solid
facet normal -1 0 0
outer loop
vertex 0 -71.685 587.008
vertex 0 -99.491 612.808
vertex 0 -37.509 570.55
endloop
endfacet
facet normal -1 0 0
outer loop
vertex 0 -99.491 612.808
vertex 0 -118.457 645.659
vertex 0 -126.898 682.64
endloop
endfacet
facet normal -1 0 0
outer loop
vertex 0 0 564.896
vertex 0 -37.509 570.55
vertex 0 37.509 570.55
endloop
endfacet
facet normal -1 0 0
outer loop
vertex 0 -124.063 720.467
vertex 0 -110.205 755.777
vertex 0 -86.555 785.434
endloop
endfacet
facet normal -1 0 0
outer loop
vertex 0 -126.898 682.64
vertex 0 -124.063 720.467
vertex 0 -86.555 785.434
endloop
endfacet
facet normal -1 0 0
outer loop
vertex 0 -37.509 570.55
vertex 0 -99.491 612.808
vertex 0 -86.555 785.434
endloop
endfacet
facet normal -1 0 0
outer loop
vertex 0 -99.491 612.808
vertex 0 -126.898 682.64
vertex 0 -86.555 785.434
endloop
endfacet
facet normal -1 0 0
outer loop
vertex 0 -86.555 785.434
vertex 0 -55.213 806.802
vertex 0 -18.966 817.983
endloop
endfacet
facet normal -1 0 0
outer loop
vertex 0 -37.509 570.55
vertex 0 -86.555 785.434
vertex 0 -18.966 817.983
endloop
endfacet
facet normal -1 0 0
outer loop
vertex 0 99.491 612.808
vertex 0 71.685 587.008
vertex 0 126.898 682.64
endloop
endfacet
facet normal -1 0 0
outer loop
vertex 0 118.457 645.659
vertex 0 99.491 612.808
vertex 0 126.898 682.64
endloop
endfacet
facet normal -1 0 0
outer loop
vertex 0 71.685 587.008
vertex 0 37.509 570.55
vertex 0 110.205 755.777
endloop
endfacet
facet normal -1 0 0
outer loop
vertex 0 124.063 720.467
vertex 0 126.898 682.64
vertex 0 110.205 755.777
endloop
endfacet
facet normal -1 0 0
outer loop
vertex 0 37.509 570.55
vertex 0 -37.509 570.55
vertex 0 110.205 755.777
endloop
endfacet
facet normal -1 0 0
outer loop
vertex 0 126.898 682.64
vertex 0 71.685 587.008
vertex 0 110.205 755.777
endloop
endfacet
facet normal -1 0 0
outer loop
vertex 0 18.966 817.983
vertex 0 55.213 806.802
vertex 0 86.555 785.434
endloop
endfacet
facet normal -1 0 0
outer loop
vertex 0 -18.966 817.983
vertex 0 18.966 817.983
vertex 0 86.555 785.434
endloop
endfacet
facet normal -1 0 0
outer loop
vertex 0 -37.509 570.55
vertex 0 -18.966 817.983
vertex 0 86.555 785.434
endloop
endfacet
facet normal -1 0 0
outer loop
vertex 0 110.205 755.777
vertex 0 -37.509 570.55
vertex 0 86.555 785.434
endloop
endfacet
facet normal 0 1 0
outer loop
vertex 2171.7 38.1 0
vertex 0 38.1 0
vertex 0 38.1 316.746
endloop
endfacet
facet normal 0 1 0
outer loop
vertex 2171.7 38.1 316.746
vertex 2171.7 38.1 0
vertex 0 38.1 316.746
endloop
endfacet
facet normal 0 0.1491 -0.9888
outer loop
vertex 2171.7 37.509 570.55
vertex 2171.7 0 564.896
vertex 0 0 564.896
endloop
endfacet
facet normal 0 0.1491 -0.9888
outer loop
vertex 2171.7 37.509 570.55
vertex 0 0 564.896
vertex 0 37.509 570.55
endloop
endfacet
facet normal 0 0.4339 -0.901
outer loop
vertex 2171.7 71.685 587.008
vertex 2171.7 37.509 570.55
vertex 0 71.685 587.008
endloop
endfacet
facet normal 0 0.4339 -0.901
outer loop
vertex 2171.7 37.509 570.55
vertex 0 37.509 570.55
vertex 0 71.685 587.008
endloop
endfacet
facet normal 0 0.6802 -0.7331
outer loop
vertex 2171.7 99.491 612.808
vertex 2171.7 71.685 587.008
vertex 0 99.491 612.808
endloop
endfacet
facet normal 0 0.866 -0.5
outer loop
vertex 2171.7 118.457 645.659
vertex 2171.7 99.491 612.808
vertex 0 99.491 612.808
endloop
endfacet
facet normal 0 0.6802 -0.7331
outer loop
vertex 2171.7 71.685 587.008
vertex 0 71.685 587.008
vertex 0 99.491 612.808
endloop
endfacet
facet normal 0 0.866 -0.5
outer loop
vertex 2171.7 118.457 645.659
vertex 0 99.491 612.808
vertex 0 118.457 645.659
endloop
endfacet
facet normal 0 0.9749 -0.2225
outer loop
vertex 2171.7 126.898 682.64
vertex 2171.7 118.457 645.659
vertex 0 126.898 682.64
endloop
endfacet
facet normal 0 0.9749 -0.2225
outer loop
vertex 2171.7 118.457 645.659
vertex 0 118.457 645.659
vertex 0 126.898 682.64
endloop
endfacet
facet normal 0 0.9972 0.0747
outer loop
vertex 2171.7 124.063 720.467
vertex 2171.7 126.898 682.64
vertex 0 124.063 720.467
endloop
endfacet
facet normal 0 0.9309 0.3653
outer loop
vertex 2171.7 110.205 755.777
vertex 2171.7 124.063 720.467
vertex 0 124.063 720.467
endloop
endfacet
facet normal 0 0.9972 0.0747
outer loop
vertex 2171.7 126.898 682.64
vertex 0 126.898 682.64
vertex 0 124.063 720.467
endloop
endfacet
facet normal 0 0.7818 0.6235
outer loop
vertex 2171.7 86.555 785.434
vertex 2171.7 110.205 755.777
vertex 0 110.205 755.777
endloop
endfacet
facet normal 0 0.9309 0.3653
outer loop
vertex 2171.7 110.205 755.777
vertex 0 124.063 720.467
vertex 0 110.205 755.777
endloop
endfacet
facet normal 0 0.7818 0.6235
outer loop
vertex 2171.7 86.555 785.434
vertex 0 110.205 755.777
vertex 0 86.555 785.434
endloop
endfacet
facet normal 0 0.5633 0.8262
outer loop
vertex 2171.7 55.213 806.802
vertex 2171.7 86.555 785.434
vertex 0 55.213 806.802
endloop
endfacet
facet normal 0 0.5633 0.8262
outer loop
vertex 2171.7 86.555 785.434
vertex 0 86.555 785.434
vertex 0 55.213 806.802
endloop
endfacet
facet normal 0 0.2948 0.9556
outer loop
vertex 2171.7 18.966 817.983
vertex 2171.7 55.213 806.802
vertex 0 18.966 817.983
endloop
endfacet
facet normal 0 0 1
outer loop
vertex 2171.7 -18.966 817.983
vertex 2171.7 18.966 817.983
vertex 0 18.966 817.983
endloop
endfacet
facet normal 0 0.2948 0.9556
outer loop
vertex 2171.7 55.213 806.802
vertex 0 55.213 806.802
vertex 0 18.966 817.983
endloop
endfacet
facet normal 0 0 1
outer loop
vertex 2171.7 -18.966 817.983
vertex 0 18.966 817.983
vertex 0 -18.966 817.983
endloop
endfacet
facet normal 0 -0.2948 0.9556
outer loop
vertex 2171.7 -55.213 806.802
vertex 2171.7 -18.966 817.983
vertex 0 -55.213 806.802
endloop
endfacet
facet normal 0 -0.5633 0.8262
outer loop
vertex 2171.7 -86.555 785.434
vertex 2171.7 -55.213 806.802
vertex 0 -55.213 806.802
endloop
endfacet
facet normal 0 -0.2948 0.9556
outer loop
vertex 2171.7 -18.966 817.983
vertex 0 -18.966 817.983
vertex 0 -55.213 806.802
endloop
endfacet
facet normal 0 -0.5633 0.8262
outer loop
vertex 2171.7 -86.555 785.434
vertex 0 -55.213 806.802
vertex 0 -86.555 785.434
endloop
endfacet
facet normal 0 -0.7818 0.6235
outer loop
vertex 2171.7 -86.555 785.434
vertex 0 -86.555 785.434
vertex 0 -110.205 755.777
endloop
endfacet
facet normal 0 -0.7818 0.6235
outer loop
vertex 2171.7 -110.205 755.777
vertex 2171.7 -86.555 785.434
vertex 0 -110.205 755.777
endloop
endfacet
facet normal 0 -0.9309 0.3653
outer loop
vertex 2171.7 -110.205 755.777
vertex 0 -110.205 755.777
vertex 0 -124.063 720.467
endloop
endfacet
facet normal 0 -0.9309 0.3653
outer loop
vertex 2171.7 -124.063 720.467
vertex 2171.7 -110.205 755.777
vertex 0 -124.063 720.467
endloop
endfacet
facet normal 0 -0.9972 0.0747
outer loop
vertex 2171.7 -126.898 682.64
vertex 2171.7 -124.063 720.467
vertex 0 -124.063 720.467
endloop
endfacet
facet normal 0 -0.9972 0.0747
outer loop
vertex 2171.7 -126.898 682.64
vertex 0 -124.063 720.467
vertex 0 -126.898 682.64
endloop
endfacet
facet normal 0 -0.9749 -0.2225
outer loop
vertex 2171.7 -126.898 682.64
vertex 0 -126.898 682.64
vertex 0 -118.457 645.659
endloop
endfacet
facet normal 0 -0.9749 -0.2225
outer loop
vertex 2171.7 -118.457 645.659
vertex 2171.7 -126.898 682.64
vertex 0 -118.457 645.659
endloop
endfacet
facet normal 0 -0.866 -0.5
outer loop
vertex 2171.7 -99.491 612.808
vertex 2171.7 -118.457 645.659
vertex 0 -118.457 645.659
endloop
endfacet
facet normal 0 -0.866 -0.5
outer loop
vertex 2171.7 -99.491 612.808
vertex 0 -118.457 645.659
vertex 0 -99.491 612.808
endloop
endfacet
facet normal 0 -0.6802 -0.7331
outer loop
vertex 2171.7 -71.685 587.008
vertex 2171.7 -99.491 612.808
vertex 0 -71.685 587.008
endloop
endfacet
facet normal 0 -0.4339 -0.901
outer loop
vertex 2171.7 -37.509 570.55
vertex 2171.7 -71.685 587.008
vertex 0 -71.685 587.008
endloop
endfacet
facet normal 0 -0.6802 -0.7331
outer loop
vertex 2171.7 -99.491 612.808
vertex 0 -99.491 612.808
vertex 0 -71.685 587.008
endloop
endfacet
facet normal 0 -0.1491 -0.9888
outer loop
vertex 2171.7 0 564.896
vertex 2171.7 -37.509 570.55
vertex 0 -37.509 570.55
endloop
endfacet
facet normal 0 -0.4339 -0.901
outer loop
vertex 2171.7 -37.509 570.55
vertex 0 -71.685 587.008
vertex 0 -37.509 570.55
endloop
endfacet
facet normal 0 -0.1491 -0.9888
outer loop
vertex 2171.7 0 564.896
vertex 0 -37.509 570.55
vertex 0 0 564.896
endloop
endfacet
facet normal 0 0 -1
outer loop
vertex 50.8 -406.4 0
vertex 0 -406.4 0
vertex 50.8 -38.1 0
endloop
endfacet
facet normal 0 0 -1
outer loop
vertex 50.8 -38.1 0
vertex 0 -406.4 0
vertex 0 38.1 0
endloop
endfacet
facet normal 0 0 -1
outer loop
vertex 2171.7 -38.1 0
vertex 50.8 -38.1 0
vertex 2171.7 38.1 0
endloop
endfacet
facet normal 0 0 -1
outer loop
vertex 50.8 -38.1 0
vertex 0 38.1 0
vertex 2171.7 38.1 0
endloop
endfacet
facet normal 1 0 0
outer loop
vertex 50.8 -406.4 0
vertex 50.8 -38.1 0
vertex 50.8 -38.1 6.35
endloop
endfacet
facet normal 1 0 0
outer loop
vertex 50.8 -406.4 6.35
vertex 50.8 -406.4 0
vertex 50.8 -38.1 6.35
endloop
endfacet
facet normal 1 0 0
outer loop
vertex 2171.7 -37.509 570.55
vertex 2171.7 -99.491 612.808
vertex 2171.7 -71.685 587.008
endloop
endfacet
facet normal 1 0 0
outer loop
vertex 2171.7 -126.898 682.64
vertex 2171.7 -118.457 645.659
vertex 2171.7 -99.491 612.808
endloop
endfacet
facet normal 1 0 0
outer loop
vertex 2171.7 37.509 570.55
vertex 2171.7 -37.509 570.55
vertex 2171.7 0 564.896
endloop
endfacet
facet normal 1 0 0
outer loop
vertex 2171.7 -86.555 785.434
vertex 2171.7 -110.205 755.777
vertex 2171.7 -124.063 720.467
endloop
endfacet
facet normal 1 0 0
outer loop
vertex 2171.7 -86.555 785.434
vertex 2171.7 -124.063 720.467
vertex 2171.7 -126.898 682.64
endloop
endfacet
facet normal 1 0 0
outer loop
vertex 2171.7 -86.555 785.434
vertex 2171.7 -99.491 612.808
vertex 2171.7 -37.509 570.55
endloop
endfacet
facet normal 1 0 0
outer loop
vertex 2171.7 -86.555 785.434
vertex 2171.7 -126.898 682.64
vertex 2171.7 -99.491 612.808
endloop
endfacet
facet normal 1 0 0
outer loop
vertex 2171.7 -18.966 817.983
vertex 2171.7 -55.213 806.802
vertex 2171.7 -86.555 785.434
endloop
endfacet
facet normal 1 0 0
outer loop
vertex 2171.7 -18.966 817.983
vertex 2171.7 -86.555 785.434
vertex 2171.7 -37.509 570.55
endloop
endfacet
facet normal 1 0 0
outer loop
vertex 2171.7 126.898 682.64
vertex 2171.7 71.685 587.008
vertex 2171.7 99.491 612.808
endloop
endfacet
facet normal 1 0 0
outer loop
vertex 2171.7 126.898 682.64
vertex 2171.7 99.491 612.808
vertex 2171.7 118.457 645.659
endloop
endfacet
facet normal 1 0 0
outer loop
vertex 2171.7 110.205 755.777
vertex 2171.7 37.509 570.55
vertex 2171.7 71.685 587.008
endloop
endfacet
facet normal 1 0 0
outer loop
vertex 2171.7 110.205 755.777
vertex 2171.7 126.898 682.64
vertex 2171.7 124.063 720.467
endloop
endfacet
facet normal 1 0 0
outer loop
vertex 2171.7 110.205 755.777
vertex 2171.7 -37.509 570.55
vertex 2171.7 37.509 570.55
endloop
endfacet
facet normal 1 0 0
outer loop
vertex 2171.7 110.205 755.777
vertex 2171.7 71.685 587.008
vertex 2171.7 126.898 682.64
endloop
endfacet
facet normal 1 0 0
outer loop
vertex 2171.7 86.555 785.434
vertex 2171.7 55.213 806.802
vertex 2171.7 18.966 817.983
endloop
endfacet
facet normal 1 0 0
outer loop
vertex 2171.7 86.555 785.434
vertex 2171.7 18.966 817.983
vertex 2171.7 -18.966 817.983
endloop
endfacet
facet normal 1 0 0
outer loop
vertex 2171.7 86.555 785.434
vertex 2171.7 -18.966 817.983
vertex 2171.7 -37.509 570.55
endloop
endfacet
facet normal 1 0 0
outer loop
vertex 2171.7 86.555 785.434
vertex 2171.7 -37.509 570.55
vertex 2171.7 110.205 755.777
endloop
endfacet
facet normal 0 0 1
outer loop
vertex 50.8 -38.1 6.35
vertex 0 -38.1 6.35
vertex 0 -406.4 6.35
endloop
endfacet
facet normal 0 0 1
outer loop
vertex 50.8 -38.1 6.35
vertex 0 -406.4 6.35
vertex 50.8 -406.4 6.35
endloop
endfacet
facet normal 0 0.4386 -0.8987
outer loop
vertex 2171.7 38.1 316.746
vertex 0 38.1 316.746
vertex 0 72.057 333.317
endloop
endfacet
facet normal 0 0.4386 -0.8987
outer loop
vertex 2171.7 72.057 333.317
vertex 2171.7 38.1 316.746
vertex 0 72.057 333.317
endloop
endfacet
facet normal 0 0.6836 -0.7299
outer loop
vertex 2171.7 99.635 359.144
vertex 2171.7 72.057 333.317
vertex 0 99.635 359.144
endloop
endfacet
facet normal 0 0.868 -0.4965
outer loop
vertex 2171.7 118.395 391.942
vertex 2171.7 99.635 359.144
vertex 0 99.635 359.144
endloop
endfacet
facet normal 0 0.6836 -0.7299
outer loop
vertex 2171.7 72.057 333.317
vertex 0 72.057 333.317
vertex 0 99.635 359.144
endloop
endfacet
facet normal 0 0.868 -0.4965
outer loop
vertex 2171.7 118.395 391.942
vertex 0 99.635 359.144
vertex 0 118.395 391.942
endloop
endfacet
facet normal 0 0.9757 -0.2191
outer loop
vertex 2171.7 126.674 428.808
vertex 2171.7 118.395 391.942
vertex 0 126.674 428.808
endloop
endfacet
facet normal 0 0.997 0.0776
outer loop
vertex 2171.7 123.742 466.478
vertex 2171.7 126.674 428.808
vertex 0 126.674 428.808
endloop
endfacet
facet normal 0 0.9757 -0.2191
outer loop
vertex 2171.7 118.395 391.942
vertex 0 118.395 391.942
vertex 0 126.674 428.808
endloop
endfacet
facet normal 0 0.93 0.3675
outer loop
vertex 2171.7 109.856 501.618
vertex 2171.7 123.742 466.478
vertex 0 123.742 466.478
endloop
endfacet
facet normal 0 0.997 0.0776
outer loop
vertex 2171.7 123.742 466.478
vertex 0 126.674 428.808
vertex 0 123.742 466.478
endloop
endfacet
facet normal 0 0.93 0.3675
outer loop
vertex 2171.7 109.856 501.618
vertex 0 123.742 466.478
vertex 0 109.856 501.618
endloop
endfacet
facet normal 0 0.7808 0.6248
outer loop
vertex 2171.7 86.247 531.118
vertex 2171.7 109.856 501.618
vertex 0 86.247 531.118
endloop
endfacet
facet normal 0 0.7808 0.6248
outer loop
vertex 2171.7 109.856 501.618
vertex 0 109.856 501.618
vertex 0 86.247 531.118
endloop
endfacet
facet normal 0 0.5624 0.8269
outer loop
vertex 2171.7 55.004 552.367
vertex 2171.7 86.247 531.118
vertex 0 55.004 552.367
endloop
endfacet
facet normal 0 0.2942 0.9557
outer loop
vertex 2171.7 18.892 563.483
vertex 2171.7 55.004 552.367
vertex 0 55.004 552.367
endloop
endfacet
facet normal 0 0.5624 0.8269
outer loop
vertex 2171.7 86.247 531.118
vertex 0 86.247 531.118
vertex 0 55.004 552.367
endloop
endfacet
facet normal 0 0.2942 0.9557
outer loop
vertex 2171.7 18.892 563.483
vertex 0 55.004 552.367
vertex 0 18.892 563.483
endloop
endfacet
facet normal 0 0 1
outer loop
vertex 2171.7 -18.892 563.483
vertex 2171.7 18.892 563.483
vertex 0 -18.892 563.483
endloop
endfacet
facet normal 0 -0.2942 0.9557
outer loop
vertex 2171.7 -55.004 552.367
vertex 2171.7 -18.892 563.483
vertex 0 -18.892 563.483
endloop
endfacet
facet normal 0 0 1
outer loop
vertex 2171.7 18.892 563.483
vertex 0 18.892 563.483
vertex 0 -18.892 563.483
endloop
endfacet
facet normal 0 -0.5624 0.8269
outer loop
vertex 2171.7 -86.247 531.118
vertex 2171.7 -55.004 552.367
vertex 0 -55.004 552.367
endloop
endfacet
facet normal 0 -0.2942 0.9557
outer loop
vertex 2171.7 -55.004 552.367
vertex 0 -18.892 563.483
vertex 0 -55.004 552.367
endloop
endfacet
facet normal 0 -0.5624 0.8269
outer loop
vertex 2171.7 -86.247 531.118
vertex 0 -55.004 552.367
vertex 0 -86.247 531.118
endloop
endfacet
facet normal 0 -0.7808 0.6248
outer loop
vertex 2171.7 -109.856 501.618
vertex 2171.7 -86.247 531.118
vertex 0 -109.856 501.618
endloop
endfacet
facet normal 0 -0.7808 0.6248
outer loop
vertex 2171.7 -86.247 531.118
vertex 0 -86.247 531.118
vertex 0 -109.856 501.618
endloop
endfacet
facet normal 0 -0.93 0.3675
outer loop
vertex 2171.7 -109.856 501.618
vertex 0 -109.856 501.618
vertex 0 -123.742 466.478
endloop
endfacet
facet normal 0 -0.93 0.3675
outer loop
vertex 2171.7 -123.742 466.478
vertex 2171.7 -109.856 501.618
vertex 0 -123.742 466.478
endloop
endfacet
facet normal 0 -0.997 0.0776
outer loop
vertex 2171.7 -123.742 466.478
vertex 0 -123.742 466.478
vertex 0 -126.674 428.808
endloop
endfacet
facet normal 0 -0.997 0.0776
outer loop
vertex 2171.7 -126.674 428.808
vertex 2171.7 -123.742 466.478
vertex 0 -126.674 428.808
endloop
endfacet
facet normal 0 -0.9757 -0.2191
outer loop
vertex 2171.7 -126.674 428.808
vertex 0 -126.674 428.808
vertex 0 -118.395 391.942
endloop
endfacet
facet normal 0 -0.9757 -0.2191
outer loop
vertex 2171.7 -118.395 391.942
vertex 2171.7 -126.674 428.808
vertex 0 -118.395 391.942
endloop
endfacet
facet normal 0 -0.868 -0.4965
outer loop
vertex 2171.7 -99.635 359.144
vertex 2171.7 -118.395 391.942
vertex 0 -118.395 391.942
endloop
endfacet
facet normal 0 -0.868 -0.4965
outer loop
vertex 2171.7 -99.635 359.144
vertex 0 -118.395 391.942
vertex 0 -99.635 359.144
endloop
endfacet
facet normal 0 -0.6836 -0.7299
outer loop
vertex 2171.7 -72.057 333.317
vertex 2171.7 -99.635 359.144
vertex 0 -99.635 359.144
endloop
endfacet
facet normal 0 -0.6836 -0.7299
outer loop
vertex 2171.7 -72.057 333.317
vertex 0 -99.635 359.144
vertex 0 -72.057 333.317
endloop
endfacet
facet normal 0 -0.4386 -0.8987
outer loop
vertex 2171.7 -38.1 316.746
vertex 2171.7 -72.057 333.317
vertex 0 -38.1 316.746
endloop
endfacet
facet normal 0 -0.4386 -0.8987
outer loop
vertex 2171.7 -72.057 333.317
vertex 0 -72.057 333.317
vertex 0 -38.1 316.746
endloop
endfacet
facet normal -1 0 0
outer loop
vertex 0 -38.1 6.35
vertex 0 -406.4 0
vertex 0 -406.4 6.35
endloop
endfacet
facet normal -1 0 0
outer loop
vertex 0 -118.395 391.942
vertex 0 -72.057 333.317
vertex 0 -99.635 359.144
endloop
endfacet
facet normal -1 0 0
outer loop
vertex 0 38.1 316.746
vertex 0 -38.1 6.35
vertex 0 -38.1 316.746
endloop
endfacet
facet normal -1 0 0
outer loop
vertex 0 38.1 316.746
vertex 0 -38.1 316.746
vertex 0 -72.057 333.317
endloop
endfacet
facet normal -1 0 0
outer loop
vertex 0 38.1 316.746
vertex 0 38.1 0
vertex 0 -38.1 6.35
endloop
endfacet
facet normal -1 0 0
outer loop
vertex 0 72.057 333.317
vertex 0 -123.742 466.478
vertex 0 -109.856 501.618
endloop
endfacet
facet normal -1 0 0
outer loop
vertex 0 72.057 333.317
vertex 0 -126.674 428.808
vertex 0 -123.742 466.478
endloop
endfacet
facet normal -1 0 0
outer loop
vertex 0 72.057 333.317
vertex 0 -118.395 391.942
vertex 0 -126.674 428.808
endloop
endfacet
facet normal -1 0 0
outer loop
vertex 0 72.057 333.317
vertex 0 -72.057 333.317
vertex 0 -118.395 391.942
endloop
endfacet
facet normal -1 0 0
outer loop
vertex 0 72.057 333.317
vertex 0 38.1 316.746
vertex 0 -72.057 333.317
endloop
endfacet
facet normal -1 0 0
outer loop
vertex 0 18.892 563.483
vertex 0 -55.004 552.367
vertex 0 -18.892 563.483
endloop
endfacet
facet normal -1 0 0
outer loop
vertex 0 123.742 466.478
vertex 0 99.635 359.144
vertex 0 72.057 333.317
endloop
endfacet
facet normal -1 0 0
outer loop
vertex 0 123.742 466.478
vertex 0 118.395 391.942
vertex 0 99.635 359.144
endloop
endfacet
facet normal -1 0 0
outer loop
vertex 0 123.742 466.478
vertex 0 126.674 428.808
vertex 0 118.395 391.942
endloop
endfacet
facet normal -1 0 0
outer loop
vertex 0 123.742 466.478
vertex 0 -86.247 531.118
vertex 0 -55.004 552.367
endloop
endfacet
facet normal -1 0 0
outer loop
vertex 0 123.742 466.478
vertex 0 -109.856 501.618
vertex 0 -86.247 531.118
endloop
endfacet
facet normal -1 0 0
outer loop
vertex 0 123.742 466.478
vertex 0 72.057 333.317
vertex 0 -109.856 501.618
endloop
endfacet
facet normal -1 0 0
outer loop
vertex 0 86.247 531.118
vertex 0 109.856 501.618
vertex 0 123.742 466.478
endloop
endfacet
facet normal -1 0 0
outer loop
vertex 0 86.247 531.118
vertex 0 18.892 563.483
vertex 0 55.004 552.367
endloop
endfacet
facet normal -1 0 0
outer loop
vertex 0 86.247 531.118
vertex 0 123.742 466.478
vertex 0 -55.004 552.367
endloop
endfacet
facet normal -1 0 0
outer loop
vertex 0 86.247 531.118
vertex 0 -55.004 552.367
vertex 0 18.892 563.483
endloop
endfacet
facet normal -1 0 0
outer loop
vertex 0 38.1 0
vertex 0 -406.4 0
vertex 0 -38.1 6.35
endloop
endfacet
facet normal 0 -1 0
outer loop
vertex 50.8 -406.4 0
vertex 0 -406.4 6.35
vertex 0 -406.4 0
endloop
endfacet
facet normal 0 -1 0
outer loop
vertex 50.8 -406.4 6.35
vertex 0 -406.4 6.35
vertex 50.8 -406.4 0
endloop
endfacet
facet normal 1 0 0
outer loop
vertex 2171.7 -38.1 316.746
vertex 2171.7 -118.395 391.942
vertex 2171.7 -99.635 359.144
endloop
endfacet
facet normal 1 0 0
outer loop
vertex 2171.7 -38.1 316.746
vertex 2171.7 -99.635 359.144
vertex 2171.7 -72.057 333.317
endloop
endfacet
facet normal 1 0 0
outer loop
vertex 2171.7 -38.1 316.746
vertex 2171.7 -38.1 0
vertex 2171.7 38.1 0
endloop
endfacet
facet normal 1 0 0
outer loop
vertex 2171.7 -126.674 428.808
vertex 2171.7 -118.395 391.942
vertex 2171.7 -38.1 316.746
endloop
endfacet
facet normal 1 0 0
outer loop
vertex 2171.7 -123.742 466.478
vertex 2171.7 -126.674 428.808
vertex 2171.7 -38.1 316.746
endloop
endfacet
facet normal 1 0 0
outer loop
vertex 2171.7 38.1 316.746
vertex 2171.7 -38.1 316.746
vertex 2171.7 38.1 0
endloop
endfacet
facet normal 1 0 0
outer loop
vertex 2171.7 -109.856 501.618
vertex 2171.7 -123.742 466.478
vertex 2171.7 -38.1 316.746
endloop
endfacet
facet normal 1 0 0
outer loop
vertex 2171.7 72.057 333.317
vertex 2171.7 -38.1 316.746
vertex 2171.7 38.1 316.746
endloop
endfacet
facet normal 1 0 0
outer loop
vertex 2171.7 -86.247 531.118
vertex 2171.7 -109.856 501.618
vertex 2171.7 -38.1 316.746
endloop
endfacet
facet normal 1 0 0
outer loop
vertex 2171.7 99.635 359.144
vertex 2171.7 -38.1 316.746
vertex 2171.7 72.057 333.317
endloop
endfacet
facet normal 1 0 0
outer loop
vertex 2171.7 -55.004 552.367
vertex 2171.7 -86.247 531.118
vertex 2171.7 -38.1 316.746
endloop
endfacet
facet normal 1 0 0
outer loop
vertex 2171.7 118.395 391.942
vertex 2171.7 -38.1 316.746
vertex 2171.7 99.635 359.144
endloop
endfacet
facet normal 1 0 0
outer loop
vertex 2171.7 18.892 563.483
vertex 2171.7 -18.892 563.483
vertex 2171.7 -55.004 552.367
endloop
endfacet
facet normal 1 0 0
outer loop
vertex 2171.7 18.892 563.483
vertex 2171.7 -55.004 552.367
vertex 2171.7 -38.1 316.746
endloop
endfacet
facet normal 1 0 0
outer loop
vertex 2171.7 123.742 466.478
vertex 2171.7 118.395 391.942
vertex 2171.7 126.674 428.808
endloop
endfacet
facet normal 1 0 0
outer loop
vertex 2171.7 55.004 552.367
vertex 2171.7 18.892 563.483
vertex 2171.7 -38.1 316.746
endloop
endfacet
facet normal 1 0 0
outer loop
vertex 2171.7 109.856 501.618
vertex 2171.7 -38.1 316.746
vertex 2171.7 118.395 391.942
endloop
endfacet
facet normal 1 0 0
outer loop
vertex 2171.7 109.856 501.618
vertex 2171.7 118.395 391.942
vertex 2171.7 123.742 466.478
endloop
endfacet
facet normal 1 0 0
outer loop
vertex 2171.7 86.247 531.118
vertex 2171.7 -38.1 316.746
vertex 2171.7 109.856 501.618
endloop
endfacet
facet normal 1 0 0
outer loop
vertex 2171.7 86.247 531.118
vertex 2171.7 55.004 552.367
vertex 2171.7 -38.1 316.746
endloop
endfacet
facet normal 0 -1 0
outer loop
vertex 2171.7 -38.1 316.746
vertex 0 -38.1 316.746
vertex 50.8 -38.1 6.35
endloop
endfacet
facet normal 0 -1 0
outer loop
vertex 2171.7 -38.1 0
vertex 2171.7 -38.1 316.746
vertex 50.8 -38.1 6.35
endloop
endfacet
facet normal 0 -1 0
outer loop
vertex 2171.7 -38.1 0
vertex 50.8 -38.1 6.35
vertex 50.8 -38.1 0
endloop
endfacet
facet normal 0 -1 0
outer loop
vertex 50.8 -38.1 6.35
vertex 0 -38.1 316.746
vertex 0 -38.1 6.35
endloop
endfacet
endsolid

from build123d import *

# Parameters (mm, degrees)
F1_DEPTH = 2171.7
F2_W     = 50.8
F2_H     = 6.35
F3_DEPTH = 406.4


with BuildPart() as f1:
    # F0 (on Right) → F1 (new body)
    with BuildSketch(Plane.YZ):
        with BuildLine():
            ThreePointArc((127.254, 692.15), (-89.9821663331, 782.1321663331), (0, 564.896))
            ThreePointArc((0, 564.896), (89.9821663331, 602.1678336669), (127.254, 692.15))
        make_face()
    extrude(amount=F1_DEPTH)


with BuildPart() as f1b:
    # F0 (on Right) → F1, piece 2 (new body)
    with BuildSketch(Plane.YZ):
        with BuildLine():
            ThreePointArc((0, 310.896), (19.2732278089, 312.3669488213), (38.1, 316.74572142))
            ThreePointArc((38.1, 316.74572142), (102.3906734034, 362.7617867546), (127, 437.896))
            ThreePointArc((127, 437.896), (89.8025612107, 527.6985612107), (0, 564.896))
            Line((0, 564.896), (0, 437.896))
            Line((0, 437.896), (0, 310.896))
        make_face()
        with BuildLine():
            ThreePointArc((-38.1, 316.74572142), (-19.2732278089, 312.3669488213), (0, 310.896))
            Line((0, 310.896), (0, 437.896))
            Line((0, 437.896), (0, 564.896))
            ThreePointArc((0, 564.896), (-125.5290511787, 457.1692278089), (-38.1, 316.74572142))
        make_face()
        with BuildLine():
            Line((0, 0), (38.1, 0))
            Line((38.1, 0), (38.1, 316.74572142))
            ThreePointArc((38.1, 316.74572142), (19.2732278089, 312.3669488213), (0, 310.896))
            Line((0, 310.896), (0, 0))
        make_face()
        with BuildLine():
            Line((-38.1, 0), (0, 0))
            Line((0, 0), (0, 310.896))
            ThreePointArc((0, 310.896), (-19.2732278089, 312.3669488213), (-38.1, 316.74572142))
            Line((-38.1, 316.74572142), (-38.1, 0))
        make_face()
    extrude(amount=F1_DEPTH)

    # F2 (on Front) → F3 (join)
    with BuildSketch(Plane.XZ):
        with Locations((25.4, 3.175)):
            Rectangle(F2_W, F2_H)
    extrude(amount=F3_DEPTH)


solid = Compound([f1.part, f1b.part])
